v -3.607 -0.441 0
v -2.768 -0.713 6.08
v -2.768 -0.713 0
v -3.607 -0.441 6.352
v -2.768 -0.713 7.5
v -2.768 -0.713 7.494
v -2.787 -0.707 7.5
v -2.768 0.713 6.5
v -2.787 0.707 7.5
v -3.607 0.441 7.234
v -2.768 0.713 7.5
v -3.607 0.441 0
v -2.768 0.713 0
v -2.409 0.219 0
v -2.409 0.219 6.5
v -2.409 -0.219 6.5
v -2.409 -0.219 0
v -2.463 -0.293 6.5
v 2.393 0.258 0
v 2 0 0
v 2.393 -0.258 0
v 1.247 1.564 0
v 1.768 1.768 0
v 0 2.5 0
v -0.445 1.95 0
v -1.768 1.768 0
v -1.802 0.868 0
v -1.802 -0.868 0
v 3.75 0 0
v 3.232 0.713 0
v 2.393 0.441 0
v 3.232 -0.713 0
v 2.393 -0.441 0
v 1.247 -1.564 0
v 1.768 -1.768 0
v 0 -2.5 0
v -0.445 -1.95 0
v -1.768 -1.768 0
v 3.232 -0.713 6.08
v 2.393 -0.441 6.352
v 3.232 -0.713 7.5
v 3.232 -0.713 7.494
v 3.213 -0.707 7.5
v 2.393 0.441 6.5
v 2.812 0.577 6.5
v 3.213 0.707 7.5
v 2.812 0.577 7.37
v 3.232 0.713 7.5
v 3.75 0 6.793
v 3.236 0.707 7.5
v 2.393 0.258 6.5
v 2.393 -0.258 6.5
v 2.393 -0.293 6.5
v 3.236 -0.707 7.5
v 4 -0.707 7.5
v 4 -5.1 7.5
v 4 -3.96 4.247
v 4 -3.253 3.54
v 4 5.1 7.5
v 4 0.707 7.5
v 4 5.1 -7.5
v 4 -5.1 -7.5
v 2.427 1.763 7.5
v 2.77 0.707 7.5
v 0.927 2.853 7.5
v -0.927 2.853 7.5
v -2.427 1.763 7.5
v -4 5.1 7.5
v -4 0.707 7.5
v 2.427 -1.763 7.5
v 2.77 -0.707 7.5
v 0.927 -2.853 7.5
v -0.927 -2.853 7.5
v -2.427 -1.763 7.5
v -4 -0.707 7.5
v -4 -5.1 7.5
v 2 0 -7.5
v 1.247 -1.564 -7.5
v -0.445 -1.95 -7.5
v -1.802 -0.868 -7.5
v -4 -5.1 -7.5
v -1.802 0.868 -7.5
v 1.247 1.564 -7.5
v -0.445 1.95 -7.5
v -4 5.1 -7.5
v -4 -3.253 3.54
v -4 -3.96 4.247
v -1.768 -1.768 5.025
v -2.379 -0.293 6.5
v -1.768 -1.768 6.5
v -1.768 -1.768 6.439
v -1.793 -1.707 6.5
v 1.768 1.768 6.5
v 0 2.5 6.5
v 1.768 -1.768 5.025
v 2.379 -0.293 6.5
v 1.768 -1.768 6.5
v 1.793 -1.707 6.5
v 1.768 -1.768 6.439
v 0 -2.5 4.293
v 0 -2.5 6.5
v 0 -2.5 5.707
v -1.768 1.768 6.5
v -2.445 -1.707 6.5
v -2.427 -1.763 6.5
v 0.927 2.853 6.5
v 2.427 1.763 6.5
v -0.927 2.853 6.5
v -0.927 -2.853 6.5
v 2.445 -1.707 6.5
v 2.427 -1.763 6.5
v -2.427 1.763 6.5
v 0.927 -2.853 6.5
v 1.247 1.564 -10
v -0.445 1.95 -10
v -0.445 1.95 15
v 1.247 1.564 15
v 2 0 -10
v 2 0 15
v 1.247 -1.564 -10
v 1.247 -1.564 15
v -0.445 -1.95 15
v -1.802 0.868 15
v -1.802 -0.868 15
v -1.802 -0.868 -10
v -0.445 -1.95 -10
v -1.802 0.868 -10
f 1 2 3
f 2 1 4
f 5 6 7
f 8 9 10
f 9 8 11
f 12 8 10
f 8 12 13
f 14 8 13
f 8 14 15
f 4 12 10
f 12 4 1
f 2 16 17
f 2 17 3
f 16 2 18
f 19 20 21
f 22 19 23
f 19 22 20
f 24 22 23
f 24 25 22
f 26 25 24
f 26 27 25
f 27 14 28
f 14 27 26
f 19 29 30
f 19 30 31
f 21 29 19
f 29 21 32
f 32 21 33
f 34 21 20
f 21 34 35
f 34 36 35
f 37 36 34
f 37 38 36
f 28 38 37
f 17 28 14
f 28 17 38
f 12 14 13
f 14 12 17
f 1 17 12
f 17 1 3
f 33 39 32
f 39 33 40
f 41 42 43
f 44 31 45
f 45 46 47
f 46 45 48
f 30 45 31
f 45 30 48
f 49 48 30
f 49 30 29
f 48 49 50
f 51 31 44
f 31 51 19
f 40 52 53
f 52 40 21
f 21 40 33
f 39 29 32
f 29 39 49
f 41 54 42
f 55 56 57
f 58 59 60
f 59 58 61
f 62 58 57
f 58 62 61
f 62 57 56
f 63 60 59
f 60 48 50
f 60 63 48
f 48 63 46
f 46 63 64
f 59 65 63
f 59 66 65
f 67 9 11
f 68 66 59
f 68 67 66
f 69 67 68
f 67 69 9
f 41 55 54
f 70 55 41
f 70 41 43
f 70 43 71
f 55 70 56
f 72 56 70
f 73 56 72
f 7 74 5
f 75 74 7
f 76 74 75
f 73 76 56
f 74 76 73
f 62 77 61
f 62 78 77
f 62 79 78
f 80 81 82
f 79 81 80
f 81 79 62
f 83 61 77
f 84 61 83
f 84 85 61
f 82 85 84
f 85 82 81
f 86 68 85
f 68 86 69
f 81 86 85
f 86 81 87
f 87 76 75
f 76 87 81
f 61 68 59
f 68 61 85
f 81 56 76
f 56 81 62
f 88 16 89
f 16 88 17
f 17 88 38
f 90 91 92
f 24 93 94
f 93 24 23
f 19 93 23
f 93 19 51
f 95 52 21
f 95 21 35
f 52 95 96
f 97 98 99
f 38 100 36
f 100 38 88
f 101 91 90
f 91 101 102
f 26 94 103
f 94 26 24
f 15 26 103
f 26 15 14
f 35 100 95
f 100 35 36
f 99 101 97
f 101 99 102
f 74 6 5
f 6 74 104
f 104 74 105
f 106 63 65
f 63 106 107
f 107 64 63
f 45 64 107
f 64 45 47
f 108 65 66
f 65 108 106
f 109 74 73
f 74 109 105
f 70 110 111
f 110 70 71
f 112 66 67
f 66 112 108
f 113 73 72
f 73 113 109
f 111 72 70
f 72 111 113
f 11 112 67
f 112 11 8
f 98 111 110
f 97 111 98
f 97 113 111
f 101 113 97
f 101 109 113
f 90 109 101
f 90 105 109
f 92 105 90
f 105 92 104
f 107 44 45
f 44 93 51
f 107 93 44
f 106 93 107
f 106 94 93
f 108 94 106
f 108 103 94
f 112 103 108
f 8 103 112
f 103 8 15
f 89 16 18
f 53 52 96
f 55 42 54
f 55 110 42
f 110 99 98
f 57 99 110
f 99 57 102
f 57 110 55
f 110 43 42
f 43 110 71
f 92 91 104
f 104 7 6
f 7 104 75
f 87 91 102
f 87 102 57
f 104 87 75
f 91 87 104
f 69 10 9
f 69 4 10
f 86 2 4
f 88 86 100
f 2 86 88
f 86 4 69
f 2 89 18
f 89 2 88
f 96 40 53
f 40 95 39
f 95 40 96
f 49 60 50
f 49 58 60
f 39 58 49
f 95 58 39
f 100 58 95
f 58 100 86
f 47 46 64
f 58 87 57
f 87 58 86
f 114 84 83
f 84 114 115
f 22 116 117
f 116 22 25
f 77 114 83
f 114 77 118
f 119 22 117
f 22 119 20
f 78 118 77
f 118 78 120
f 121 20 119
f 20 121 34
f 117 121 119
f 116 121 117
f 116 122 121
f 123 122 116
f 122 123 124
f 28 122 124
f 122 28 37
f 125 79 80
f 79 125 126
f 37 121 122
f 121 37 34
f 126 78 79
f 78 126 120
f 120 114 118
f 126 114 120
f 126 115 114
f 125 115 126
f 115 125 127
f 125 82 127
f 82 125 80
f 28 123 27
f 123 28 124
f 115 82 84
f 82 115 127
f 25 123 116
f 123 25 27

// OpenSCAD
// Leadscrew nut housing

// Main body block dimensions
main_width = 8.0;
main_depth = 10.2;
main_height = 15.0;

// Main body block
module main_body_block() {
    cube([main_width, main_depth, main_height], center = true);
}

// Placeholder for nut cavity or bore
module nut_cavity_or_bore() {
    // Example cylindrical bore
    translate([0, 0, main_height/2])
        cylinder(h = main_height, d = 5, center = true);
}

// Placeholder for nut retention feature
module nut_retention_feature() {
    // Example retention feature
    translate([0, 0, main_height/2])
        cylinder(h = 2, d = 6, center = true);
}

// Placeholder for mounting holes or slots
module mounting_holes_or_slots() {
    // Example mounting holes
    translate([-3, 0, main_height/2])
        cylinder(h = main_height, d = 1.5, center = true);
    translate([3, 0, main_height/2])
        cylinder(h = main_height, d = 1.5, center = true);
}

// Placeholder for lead-in chamfers
module lead_in_chamfers() {
    // Example chamfer on top edges
    translate([0, 0, main_height/2])
        rotate([45, 0, 0])
        cube([main_width, main_depth, 1], center = true);
}

// Placeholder for leadscrew
module leadscrew() {
    // Example leadscrew
    translate([0, 0, main_height/2])
        cylinder(h = main_height + 10, d = 4, center = true);
}

// Assemble the leadscrew nut housing
difference() {
    main_body_block();
    nut_cavity_or_bore();
    nut_retention_feature();
    mounting_holes_or_slots();
    lead_in_chamfers();
}

// Visualize the leadscrew
translate([0, 0, -5])
    leadscrew();
